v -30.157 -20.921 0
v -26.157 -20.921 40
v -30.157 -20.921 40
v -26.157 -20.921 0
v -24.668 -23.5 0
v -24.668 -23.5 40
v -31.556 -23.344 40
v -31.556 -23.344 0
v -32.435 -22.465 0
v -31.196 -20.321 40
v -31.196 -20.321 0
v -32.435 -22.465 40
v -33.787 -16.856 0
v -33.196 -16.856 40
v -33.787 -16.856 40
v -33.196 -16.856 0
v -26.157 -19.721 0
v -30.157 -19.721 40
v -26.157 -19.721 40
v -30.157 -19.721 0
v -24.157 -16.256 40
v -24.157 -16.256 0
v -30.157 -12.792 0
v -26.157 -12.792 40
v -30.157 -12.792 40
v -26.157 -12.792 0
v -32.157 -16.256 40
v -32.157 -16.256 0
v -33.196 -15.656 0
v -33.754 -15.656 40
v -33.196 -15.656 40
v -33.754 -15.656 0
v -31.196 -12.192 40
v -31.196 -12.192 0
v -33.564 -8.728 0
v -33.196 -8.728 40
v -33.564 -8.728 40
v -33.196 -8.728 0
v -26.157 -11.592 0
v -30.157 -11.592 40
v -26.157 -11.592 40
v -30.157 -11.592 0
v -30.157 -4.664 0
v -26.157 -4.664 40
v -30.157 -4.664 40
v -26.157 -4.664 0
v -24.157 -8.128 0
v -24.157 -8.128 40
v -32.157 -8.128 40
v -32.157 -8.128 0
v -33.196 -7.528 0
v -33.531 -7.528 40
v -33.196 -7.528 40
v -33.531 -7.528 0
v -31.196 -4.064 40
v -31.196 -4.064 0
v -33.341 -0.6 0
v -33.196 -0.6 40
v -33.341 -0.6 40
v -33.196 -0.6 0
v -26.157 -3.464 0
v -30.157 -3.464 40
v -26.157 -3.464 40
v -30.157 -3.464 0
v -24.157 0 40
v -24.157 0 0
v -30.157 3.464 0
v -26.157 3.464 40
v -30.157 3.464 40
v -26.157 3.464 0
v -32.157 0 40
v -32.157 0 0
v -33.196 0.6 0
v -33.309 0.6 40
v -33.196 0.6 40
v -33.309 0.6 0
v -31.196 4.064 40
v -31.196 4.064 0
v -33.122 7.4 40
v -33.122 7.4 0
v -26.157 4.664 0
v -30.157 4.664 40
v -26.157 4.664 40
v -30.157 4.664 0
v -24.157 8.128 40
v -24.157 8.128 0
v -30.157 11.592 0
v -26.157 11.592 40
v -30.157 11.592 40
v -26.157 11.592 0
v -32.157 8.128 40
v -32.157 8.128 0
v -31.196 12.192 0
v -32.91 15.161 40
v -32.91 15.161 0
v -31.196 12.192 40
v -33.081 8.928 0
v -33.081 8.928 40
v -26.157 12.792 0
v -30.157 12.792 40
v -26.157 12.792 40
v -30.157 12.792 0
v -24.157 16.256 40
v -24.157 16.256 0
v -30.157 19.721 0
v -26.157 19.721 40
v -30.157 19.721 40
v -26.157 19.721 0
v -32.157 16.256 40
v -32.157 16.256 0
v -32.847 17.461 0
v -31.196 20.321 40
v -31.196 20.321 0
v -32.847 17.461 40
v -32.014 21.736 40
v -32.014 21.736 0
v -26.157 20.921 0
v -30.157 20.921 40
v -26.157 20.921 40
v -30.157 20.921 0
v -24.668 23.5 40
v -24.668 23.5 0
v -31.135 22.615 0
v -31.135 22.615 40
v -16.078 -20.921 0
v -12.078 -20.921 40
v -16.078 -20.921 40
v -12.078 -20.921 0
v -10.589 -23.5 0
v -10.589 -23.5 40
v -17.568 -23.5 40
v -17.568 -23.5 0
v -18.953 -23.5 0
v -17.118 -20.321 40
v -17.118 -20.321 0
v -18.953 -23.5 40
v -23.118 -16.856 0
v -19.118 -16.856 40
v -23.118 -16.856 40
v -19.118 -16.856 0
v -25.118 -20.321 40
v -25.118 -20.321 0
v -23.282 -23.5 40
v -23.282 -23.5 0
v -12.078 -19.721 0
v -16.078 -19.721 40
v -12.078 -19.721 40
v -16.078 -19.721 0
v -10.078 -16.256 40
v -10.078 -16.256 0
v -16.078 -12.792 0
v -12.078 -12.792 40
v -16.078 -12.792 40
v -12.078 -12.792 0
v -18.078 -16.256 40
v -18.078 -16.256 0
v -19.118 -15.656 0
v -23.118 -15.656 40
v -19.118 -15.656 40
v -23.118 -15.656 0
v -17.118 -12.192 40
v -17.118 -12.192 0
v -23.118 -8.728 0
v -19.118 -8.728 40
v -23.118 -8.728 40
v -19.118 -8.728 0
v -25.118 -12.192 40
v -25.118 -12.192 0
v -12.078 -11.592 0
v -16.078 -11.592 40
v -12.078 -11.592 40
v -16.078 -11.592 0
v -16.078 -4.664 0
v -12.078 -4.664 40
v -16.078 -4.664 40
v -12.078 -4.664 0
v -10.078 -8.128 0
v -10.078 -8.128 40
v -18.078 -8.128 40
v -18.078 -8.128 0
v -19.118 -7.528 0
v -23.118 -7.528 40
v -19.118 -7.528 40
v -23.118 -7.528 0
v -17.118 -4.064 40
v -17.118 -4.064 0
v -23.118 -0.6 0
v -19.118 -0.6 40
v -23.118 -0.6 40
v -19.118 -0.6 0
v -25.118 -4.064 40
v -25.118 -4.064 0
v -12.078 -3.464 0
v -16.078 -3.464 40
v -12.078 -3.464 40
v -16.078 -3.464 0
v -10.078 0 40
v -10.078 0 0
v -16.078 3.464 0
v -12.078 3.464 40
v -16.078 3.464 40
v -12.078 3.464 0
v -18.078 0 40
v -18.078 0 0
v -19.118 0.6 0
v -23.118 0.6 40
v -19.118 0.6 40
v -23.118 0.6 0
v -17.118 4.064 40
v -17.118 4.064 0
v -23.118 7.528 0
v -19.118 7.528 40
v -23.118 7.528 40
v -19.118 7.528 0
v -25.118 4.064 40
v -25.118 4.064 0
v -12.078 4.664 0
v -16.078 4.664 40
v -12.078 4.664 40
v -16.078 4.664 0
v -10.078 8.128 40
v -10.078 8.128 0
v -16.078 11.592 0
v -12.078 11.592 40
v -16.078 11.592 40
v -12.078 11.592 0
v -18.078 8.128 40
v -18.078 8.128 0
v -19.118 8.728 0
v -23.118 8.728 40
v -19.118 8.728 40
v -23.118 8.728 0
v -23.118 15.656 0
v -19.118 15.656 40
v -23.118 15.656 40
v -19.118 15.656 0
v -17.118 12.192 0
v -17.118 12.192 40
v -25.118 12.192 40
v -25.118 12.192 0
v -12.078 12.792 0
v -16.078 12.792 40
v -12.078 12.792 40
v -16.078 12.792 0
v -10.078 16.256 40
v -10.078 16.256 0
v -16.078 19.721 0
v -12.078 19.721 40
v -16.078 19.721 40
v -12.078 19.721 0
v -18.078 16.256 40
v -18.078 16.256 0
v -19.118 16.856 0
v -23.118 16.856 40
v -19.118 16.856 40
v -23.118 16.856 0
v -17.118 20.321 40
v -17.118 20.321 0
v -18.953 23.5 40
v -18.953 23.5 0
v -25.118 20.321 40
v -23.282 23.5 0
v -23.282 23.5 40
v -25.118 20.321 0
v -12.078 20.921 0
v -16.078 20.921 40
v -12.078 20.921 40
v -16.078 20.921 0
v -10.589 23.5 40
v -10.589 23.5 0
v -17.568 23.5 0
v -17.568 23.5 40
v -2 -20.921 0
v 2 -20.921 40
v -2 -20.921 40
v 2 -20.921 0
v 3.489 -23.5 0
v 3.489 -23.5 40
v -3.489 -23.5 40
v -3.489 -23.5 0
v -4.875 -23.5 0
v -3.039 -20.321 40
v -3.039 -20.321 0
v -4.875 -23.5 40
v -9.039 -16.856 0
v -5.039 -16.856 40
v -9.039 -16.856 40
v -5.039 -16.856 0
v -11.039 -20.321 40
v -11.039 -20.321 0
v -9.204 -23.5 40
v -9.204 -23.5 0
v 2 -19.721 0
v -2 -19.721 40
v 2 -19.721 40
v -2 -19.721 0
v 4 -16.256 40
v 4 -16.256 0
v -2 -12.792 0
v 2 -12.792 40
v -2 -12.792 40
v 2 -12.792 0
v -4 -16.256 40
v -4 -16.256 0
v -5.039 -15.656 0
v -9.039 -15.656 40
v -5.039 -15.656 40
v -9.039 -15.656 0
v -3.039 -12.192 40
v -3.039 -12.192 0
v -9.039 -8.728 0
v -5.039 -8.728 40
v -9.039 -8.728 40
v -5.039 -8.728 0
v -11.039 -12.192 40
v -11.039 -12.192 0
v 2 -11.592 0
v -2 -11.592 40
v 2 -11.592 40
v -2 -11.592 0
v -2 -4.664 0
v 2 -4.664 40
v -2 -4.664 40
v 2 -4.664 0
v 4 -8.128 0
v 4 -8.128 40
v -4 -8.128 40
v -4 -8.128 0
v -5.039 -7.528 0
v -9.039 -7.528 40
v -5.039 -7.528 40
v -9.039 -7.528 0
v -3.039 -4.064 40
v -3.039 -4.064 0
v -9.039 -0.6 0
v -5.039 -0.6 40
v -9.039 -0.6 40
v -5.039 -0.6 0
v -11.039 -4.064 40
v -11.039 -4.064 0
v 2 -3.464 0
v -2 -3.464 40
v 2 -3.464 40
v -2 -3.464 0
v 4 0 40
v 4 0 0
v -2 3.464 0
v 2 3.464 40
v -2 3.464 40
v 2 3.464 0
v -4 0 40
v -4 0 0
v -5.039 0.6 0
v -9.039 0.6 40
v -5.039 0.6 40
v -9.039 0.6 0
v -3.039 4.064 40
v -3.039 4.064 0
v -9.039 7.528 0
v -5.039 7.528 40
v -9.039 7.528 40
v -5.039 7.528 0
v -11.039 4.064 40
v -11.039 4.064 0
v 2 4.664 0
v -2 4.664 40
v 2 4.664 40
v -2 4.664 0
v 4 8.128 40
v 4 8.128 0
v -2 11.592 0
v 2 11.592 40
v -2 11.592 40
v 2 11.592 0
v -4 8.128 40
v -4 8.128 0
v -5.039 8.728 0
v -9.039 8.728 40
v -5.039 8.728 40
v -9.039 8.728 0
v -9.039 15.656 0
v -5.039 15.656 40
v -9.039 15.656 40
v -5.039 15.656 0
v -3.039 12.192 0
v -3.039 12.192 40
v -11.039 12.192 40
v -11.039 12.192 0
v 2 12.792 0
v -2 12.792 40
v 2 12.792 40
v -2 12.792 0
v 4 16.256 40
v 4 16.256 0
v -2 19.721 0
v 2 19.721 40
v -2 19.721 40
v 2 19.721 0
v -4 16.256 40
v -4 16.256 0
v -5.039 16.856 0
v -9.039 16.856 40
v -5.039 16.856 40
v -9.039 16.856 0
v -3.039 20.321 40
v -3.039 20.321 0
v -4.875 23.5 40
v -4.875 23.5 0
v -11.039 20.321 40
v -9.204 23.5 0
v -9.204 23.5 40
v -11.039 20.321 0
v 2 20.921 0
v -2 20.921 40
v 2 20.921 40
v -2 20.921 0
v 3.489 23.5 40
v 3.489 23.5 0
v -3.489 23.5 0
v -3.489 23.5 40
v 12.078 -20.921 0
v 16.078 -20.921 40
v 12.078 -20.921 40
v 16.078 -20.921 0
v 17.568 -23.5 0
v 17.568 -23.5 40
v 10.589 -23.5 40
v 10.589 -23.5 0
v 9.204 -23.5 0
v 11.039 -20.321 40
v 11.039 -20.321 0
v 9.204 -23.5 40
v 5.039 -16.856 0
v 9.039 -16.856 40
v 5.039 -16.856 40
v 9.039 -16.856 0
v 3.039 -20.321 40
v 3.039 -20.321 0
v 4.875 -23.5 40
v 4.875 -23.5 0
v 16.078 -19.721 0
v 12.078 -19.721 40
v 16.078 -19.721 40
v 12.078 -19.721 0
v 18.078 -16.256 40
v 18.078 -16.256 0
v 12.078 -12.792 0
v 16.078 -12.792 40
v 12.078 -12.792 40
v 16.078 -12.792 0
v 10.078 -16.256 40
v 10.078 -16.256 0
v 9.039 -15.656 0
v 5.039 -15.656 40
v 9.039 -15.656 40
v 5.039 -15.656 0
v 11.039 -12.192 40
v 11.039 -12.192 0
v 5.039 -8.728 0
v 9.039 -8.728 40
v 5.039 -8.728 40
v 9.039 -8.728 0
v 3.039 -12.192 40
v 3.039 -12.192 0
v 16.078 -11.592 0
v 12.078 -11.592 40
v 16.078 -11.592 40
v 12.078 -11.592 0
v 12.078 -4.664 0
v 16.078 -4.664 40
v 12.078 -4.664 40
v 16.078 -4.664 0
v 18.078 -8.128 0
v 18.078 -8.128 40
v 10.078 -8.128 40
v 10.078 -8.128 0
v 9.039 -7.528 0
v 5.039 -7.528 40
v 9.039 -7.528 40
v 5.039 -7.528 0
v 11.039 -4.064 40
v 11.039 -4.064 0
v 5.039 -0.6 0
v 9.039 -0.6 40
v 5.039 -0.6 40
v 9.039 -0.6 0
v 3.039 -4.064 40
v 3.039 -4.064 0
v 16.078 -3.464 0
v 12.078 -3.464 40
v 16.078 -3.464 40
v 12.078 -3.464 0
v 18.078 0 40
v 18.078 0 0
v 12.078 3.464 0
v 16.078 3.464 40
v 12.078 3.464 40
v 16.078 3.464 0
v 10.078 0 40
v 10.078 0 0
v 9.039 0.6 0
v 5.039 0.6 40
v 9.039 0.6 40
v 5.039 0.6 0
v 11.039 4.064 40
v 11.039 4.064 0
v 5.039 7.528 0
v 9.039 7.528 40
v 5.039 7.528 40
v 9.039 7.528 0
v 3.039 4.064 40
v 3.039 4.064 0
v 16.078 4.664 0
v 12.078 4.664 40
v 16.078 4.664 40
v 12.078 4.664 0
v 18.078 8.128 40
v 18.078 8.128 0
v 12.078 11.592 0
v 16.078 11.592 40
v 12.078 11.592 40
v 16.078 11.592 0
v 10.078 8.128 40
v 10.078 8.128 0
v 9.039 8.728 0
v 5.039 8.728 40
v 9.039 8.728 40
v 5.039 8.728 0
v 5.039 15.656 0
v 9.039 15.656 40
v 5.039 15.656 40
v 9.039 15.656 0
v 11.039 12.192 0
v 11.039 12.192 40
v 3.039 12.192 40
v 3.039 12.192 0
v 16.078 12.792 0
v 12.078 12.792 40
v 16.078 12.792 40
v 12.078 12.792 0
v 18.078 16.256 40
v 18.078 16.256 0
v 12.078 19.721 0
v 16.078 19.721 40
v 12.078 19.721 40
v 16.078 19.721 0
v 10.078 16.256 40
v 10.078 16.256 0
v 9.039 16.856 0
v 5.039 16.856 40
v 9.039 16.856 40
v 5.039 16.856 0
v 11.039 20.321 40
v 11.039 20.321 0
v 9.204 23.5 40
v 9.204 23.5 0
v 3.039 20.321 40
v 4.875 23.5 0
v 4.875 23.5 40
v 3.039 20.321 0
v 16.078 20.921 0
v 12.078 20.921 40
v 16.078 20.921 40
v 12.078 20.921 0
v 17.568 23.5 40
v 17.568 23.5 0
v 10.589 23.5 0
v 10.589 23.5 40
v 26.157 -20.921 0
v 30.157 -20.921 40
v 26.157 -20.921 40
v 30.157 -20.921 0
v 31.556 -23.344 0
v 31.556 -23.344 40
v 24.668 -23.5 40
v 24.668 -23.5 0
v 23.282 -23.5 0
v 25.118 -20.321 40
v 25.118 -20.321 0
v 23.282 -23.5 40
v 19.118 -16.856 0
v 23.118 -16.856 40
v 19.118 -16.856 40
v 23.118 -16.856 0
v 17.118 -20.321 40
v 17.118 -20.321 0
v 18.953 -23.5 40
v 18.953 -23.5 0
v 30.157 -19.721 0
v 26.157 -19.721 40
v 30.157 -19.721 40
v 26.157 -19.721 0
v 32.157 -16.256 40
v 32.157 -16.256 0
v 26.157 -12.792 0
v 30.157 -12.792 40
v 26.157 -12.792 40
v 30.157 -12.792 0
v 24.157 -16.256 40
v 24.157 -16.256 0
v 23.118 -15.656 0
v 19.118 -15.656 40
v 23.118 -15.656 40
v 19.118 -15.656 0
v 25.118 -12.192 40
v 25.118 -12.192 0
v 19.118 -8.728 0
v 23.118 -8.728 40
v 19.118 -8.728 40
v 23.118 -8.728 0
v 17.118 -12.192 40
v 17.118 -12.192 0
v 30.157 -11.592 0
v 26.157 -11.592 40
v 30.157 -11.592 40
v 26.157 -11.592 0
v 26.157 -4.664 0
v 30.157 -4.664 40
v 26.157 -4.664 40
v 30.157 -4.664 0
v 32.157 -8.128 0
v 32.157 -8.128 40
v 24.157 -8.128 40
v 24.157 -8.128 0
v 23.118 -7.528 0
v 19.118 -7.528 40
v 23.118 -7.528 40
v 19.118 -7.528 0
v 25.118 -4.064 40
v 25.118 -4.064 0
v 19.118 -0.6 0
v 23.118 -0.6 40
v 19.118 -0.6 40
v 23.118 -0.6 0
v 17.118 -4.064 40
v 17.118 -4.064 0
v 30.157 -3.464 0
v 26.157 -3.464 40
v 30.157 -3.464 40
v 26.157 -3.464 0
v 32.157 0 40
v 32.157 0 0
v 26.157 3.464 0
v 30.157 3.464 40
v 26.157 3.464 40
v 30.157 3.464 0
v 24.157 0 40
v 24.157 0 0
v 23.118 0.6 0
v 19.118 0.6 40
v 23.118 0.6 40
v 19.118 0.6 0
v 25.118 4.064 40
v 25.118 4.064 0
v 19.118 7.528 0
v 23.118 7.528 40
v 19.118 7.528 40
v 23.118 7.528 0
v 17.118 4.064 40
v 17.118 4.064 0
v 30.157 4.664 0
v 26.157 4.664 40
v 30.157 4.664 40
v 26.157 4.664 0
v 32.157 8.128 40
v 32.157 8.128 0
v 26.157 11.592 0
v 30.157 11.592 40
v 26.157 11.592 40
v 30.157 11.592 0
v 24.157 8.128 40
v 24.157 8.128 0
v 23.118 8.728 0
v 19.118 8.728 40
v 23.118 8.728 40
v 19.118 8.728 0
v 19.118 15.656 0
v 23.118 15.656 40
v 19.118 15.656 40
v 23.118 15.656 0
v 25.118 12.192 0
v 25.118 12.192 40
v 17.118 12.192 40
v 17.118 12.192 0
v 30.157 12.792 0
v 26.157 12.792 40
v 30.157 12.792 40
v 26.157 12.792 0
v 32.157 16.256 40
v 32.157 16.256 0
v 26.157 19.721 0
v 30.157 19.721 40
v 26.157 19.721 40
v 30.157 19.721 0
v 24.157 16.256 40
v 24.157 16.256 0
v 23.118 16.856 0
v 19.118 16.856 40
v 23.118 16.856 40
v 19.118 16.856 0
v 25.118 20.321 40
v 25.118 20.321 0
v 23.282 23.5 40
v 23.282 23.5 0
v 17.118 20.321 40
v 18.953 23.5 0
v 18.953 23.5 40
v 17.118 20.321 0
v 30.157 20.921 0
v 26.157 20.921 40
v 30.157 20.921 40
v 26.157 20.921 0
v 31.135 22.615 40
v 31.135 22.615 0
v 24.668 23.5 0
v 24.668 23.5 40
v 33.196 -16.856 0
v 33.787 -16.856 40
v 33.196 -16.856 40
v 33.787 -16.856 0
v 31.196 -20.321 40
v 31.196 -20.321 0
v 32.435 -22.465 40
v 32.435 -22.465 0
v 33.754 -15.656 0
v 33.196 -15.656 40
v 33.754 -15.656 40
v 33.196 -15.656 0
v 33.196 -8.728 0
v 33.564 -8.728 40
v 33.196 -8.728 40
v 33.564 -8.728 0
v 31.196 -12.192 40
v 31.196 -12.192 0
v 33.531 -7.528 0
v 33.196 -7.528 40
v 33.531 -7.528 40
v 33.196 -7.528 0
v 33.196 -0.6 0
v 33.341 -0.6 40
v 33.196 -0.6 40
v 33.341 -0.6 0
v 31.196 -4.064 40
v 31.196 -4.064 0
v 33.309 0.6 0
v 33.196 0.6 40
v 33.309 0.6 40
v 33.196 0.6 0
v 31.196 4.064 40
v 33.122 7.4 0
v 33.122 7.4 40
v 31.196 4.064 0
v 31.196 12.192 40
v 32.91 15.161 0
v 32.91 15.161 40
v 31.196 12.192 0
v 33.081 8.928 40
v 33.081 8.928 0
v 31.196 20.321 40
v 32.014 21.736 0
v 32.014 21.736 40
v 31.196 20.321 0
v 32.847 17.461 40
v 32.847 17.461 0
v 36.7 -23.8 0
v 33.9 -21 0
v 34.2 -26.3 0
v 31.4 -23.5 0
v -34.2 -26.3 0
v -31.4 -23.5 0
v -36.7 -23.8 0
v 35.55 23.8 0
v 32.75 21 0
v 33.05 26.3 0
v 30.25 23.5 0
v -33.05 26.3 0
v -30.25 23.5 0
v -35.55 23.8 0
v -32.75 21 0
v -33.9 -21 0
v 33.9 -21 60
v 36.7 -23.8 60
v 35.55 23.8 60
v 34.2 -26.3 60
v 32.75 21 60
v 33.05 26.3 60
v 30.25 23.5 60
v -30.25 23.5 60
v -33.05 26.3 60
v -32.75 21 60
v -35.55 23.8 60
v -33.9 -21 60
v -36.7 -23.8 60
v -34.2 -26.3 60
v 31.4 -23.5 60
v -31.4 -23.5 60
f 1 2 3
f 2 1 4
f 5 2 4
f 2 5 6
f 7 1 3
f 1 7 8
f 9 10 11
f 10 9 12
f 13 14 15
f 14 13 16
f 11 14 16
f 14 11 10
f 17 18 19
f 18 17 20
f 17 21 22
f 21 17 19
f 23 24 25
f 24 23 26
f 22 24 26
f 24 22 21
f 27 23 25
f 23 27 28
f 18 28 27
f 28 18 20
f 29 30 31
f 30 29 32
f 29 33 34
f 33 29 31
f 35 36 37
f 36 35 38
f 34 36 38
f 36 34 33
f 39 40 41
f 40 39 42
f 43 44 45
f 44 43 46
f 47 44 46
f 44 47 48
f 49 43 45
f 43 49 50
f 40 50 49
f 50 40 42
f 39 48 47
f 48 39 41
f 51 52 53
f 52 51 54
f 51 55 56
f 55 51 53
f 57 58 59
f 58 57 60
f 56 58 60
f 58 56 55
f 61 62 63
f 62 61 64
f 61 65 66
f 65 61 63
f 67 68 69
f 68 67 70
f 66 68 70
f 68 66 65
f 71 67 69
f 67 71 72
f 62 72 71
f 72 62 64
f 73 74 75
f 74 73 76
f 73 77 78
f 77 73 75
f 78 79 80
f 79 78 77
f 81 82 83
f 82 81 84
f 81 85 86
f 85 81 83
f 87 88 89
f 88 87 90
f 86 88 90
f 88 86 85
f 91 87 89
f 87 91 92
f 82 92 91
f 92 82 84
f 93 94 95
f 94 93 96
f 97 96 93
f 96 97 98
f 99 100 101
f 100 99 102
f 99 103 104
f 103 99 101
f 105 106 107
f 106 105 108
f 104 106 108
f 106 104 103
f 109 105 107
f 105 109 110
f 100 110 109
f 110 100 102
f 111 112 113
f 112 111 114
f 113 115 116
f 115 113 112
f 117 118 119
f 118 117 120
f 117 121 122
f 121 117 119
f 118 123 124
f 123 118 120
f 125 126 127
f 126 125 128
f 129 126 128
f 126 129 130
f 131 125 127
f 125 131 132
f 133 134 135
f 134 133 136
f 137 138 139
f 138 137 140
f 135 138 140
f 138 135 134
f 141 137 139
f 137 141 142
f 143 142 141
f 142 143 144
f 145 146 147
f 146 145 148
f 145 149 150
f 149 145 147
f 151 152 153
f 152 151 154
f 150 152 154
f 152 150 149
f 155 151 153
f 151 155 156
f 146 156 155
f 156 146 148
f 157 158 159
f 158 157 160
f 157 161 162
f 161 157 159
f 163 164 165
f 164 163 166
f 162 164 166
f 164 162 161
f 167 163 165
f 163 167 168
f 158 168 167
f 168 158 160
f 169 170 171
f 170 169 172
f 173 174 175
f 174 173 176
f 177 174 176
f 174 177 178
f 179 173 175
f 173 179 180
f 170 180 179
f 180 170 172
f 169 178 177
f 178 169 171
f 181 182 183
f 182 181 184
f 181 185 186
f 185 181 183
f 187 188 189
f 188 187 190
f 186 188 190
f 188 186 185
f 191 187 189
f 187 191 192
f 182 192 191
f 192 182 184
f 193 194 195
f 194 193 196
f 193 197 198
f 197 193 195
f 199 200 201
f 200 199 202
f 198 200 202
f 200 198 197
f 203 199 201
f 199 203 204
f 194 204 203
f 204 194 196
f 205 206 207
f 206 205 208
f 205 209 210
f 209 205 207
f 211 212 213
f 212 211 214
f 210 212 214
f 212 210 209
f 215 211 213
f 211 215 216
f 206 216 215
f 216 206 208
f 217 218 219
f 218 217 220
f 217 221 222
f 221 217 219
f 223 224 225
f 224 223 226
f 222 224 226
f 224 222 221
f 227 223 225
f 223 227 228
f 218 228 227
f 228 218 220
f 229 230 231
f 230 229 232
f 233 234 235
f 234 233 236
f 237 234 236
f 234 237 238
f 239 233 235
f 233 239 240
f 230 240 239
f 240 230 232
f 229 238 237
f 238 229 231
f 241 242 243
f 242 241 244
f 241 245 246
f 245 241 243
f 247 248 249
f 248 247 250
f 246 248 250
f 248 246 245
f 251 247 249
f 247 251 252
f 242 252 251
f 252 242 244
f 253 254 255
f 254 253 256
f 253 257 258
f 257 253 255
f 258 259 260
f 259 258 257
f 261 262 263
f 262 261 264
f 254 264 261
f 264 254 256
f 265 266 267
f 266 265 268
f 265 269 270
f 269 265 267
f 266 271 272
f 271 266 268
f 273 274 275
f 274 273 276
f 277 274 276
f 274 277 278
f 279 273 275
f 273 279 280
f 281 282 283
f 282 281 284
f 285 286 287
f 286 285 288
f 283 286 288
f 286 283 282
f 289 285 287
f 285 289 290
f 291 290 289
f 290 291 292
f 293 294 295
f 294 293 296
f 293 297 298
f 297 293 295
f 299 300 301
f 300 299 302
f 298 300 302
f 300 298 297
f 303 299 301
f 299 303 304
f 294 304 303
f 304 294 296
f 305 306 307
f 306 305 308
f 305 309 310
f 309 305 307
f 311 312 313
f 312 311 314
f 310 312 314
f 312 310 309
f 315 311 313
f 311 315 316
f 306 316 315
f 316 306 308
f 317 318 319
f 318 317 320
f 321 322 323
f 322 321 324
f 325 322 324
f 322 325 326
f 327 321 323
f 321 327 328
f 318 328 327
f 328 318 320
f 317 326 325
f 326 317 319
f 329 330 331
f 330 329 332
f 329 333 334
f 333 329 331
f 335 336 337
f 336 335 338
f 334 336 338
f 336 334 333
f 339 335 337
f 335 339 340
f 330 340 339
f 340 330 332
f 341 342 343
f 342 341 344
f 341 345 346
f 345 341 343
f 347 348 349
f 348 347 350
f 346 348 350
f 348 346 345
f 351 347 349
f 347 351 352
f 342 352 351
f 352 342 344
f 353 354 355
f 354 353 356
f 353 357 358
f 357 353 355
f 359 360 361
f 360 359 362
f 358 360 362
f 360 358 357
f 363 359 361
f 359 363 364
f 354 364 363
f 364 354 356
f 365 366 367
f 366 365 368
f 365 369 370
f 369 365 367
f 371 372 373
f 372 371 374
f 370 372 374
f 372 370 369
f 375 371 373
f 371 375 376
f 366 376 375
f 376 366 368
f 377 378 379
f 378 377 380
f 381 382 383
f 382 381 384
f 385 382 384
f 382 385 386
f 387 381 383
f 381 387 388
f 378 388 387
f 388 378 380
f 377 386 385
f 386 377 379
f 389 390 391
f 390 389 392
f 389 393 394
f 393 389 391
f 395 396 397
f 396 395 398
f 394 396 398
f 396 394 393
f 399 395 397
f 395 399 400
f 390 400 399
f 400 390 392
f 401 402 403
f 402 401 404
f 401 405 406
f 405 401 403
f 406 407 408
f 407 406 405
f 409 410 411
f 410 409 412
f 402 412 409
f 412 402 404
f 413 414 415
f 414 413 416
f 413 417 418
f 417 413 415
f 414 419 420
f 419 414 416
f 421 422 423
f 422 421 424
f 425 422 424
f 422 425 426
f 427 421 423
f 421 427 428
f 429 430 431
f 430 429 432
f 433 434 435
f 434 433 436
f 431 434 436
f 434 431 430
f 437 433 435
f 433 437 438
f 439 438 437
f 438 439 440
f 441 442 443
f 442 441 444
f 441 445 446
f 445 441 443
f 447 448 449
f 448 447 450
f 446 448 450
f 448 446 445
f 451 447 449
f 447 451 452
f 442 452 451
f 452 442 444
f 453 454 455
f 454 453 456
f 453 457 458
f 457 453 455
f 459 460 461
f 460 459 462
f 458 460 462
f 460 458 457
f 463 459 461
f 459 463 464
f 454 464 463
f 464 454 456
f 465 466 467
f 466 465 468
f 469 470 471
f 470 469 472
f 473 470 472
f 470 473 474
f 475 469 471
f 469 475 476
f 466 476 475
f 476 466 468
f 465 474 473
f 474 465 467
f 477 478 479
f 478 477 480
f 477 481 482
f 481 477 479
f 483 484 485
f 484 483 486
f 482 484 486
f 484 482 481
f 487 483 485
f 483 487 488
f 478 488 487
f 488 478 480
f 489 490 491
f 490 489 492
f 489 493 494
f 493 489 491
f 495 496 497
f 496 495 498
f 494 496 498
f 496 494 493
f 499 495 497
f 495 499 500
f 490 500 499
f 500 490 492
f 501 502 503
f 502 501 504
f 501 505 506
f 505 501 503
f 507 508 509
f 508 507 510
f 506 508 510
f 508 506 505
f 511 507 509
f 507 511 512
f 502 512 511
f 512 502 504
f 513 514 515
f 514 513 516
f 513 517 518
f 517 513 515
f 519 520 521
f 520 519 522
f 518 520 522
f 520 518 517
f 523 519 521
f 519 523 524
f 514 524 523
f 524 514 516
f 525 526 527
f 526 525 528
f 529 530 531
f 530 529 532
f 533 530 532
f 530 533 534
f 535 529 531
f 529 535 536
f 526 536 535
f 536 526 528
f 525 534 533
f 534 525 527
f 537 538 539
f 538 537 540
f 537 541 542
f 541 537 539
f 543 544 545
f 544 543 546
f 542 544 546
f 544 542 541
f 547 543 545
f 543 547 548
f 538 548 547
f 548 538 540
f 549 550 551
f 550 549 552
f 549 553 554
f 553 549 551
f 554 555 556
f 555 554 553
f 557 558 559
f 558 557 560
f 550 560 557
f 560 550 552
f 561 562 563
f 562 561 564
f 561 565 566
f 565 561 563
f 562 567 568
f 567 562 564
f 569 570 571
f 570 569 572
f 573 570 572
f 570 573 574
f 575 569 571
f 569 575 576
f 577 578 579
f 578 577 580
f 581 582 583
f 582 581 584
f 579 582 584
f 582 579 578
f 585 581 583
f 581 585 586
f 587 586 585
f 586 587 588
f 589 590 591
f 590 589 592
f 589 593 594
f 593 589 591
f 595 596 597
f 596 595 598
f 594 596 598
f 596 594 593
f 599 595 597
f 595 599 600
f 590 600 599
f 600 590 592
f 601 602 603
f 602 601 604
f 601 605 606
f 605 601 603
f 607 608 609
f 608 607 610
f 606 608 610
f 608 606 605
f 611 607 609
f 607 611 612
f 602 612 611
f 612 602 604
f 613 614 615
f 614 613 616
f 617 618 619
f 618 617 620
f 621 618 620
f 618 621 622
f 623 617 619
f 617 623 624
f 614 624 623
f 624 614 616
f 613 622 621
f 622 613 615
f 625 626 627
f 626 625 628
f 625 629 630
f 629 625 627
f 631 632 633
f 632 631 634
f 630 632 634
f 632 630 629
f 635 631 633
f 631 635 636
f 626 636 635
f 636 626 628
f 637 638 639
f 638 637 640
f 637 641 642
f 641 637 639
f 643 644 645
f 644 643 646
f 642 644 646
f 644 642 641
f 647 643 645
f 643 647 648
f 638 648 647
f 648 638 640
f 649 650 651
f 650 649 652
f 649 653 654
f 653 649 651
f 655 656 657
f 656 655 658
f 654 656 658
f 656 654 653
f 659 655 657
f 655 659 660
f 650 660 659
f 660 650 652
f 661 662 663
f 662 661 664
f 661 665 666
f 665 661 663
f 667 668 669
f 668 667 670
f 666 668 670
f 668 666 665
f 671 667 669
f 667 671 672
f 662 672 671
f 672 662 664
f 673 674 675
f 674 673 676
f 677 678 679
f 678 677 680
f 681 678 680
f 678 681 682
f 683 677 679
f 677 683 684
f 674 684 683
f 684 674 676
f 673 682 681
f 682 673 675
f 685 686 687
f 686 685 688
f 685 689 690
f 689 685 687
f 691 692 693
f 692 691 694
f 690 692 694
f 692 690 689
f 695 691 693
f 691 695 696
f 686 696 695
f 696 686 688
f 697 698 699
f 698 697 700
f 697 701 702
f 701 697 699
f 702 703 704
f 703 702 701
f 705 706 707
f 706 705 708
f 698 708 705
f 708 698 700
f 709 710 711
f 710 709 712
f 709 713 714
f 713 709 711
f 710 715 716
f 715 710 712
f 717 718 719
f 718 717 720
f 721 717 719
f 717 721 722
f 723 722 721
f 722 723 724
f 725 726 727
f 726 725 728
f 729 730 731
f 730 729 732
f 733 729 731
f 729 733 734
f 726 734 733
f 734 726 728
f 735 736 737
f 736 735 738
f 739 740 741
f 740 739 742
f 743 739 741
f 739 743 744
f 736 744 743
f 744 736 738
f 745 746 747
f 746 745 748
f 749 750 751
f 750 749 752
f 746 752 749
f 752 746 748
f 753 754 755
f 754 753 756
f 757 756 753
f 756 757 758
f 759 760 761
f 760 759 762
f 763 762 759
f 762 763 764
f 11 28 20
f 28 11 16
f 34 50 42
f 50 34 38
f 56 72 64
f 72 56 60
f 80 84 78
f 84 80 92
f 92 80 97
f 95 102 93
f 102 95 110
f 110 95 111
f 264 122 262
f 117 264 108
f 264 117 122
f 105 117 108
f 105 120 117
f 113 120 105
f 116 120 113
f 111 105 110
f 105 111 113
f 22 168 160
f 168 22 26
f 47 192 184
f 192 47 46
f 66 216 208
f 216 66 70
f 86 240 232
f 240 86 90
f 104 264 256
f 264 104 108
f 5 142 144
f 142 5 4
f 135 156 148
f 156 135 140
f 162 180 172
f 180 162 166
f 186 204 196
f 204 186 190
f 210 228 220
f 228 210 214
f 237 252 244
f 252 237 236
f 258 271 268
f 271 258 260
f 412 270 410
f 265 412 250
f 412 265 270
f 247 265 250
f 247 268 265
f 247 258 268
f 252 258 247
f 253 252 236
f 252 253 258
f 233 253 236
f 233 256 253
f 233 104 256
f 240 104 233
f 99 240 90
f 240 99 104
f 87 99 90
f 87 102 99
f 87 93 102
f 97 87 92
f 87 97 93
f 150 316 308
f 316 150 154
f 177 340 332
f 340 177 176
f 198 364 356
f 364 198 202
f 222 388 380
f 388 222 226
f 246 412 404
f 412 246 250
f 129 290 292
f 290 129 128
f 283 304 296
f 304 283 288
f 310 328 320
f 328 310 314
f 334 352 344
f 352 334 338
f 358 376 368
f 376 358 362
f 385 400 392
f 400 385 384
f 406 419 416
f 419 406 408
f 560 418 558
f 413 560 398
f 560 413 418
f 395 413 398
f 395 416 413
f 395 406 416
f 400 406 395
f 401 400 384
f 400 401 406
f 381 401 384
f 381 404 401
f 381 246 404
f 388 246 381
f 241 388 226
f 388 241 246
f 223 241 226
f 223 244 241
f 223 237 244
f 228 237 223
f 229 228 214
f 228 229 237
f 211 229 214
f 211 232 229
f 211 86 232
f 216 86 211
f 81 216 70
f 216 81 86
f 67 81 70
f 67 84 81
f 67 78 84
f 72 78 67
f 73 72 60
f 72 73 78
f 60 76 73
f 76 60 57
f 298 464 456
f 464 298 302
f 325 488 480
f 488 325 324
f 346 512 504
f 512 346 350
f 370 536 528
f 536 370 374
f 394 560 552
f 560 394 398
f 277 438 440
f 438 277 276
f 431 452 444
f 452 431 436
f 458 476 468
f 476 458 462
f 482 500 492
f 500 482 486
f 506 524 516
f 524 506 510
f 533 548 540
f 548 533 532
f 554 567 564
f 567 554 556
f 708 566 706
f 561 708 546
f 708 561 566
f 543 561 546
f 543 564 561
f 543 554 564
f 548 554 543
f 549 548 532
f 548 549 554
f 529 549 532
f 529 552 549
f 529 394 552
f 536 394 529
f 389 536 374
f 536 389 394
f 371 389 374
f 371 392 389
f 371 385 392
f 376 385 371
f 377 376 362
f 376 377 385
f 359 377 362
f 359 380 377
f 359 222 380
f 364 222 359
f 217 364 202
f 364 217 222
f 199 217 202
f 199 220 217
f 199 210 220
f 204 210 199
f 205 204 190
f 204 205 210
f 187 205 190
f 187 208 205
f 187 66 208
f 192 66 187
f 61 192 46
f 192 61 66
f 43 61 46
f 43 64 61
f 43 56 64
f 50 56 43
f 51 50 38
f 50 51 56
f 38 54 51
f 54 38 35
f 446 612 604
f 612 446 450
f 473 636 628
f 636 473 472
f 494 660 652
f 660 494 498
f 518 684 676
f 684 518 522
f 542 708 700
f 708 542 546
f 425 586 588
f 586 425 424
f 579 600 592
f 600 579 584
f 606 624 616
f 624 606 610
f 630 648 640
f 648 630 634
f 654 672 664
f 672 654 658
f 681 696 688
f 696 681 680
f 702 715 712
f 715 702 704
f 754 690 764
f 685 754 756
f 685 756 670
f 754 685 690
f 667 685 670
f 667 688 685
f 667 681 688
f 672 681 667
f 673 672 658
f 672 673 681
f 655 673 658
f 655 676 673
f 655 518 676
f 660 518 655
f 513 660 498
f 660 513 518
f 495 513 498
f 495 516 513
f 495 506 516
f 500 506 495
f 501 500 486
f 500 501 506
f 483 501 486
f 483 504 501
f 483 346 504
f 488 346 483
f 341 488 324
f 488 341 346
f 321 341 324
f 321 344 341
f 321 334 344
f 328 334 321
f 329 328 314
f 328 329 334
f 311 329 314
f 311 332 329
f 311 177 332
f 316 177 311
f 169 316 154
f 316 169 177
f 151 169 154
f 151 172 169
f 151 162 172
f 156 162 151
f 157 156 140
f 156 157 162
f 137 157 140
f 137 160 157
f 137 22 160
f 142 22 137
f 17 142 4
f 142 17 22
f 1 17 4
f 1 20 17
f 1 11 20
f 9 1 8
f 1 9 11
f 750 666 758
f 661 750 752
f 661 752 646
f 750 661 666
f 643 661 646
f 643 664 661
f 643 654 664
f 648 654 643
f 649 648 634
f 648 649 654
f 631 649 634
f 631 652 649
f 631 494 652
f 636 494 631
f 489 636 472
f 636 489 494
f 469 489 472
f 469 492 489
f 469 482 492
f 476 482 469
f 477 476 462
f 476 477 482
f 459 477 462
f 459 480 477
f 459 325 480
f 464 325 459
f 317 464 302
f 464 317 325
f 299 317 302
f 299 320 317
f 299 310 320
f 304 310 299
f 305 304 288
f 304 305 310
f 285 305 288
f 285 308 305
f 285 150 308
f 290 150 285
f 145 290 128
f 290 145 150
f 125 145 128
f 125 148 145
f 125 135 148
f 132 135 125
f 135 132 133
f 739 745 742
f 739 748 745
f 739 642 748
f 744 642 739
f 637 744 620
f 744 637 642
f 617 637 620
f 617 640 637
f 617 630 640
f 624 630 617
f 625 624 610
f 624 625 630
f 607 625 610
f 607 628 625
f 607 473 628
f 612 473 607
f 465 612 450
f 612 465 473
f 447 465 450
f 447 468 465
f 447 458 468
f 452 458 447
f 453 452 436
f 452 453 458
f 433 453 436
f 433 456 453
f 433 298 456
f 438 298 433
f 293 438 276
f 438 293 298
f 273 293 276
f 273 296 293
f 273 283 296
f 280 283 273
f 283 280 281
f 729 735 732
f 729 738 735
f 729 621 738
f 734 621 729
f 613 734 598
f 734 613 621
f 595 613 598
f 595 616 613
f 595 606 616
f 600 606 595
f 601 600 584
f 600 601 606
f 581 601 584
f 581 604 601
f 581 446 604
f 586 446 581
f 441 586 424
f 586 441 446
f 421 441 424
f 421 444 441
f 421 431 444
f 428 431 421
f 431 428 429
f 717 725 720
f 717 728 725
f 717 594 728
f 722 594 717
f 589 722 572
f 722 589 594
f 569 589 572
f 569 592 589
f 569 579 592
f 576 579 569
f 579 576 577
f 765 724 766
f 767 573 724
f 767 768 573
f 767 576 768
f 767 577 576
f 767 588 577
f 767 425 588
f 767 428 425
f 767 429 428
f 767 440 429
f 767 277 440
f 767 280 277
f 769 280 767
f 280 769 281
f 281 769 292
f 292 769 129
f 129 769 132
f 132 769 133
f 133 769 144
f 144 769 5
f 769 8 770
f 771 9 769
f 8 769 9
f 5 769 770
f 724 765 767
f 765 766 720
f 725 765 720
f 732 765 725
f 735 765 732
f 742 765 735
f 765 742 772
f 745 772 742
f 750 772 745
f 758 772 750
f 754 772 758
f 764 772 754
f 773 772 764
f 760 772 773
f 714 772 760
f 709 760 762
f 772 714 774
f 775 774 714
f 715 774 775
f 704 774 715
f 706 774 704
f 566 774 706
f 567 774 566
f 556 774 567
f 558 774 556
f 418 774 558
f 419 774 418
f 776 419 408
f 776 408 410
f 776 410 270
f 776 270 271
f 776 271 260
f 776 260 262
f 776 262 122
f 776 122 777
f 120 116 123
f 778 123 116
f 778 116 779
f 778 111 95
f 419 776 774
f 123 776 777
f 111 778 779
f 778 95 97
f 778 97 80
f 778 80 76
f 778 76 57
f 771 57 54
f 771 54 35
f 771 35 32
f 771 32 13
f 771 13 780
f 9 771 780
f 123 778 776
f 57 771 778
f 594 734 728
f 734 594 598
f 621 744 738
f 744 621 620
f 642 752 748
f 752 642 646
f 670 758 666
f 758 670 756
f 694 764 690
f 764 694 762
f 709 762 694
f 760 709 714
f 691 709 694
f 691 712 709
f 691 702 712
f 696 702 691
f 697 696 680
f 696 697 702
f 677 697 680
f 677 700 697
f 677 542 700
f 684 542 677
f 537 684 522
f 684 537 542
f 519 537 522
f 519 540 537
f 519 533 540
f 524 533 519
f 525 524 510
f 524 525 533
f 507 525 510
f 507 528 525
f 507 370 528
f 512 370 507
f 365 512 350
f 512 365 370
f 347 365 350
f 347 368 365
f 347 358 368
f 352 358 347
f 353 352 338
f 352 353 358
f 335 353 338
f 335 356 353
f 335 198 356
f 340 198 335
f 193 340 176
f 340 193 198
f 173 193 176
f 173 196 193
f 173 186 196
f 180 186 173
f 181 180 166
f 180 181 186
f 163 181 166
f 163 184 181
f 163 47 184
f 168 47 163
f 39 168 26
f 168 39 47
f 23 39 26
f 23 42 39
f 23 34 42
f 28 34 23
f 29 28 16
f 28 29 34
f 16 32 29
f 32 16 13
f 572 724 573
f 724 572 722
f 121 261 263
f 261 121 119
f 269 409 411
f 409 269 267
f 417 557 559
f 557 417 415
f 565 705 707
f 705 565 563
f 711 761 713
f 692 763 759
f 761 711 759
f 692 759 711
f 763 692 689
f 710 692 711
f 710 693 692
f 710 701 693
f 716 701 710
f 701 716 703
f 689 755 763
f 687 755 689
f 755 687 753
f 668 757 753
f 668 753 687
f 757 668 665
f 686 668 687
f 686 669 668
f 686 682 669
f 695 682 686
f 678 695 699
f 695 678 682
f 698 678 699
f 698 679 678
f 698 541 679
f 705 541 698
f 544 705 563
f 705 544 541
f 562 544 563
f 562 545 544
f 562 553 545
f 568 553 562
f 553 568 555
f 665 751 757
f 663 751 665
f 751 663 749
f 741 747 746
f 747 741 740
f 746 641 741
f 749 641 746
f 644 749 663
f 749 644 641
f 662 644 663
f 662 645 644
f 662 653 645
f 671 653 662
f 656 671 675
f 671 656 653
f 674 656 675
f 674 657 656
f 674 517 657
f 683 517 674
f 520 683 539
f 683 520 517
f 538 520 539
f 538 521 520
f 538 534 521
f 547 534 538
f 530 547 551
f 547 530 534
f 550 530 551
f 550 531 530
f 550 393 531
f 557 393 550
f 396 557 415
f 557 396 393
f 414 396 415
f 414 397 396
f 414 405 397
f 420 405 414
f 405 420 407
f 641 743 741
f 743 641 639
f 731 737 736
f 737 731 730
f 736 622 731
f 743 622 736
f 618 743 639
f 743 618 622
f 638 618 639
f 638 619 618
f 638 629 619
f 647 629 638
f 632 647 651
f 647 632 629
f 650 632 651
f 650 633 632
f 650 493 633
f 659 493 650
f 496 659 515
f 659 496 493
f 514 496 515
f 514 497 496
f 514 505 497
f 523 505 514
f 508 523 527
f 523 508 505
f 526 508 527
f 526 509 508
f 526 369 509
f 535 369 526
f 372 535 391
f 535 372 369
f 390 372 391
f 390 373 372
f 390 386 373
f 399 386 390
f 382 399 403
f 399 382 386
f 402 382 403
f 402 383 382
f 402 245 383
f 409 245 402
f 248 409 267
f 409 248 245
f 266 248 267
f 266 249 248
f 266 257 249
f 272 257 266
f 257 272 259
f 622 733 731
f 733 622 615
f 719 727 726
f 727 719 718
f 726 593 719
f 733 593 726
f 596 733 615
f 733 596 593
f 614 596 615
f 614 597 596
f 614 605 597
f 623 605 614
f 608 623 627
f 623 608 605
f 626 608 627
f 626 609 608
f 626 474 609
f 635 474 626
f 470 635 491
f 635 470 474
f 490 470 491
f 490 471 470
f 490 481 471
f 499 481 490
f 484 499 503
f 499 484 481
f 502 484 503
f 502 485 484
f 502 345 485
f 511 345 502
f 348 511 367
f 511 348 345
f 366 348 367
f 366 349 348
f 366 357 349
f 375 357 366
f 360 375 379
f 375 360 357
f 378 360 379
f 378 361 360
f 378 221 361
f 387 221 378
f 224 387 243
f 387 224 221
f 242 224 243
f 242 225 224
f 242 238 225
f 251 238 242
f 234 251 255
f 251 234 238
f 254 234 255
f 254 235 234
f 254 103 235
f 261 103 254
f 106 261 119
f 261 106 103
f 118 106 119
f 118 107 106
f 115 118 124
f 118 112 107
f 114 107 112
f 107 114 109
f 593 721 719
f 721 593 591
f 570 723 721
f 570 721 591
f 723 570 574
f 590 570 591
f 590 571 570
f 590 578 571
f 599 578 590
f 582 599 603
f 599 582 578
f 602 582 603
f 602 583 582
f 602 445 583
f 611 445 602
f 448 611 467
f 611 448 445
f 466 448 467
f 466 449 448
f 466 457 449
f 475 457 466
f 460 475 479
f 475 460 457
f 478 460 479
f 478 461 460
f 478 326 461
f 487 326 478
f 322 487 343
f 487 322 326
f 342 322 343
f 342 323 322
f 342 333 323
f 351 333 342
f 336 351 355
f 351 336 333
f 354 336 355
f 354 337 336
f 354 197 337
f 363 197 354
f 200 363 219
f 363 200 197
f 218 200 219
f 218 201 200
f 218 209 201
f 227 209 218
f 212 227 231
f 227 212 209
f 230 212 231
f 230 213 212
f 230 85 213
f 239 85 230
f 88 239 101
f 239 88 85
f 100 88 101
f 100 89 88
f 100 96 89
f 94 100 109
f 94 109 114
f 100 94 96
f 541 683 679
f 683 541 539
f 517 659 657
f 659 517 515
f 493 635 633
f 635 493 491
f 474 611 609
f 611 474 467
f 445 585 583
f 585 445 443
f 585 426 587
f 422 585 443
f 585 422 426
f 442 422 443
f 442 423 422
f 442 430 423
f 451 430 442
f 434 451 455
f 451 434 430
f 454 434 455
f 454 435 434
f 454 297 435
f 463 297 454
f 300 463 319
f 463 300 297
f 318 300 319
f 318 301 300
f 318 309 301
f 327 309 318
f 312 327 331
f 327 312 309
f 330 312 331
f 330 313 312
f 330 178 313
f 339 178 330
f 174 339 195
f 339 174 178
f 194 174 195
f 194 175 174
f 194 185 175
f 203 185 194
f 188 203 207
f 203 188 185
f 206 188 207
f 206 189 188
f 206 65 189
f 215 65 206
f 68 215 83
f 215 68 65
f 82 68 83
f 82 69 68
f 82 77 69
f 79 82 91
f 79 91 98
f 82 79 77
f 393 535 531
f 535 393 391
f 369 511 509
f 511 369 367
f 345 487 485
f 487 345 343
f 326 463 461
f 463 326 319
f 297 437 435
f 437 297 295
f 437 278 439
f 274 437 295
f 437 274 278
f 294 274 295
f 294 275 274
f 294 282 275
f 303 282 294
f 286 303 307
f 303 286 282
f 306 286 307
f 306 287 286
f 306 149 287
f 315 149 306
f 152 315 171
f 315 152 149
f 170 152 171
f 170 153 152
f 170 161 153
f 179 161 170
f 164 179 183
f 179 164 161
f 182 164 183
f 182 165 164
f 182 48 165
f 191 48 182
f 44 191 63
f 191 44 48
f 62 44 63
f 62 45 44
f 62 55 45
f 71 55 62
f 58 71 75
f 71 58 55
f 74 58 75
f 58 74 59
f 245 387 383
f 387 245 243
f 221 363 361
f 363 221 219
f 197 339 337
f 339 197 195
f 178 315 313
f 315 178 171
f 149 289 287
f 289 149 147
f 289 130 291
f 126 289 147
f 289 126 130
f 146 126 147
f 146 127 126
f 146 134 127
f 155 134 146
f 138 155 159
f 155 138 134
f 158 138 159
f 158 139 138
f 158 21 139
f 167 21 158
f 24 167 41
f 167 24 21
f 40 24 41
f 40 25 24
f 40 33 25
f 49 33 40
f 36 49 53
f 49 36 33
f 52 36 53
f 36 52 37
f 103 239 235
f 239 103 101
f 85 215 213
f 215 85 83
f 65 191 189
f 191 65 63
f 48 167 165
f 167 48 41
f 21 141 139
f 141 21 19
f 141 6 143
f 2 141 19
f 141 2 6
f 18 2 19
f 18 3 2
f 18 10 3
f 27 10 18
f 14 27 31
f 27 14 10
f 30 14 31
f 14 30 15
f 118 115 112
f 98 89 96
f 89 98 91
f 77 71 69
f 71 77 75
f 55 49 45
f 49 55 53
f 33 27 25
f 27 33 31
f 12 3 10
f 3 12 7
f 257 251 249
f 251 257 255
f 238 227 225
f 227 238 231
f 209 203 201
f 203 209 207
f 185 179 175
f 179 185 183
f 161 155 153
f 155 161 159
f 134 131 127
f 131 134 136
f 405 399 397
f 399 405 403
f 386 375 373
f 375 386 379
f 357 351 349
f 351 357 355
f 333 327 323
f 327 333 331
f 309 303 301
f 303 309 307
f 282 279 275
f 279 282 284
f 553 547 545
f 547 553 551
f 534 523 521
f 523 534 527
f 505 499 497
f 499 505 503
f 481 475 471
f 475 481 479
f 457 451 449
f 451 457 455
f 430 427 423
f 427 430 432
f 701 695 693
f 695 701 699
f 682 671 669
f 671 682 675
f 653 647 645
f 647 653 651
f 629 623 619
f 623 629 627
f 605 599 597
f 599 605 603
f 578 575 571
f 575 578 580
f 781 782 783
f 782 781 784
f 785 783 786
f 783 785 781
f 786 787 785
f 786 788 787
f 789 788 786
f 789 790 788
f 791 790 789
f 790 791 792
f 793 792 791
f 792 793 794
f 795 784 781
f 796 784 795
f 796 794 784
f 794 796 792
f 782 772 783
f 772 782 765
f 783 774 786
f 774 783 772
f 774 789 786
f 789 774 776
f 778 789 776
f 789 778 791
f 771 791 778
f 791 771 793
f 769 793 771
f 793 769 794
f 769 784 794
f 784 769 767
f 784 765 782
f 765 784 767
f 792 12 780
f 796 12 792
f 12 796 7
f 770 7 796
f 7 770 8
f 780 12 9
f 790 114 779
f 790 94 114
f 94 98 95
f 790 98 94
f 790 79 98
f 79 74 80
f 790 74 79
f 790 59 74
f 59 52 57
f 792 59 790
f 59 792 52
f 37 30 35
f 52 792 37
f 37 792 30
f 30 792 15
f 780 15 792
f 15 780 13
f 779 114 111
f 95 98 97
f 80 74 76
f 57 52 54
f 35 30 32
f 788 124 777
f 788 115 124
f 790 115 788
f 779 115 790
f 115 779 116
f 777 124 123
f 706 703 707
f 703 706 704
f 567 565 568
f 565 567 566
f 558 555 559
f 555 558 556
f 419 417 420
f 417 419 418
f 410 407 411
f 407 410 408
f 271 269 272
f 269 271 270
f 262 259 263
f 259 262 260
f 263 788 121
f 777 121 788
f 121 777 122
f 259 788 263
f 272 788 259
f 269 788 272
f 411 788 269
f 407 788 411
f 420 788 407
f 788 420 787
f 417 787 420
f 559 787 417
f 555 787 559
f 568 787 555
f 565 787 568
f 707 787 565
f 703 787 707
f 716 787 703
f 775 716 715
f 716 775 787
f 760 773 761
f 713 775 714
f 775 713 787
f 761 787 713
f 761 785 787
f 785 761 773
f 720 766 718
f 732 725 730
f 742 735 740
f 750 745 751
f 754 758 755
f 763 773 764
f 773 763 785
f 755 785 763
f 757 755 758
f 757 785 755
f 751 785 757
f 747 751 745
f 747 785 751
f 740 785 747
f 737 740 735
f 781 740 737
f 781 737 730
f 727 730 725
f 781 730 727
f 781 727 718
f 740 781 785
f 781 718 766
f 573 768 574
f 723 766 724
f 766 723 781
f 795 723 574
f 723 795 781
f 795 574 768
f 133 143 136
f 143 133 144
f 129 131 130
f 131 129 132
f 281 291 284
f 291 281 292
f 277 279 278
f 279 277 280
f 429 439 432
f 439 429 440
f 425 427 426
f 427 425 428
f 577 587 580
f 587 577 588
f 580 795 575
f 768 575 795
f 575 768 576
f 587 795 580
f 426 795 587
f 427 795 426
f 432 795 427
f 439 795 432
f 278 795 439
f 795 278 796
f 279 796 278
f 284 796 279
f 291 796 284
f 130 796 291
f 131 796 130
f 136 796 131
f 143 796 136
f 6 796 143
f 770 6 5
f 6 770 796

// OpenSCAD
// file: ../mylib/hexpattern.scad
/* hexdiam: space between two facing corners of a hextile
 * spacing: space between every side of the adjacent hextiles
 * heigt:   height (z-axis) of tiles
 * widthxy: space (x- andy-axis) occupied by the hextiles 
 *
 * Centering is only approximate :-)
*/
module hexpattern(hexdiam=8, spacing=2, h=40, widthx=100, widthy=100) {
    size_x = 3/2*(hexdiam)+spacing*sqrt(3);
    size_y = spacing+sqrt(3)/2*hexdiam;
    num_x = ceil(widthx/size_x);
    num_y = ceil(widthy/size_y);
    translate([-size_x*num_x/2, -size_y*num_y/2,0])
        for (ix=[0:num_x]) {
            translate([ix*size_x,0,0])
            for (iy=[0:num_y]) {
                translate([0,size_y*iy,0])
                    cylinder(r=hexdiam/2, h=h+2, $fn=6);
                translate([size_x/2, (1/2+iy)*size_y,0])
                    cylinder(r=hexdiam/2, h=h+2, $fn=6);
            }
        }
}
// main file
include <../mylib/hexpattern.scad>;

/* this defines the flash's outline
*/
mb_width1 = 67.8;
mb_width2 = 65.5;
mb_height = 47.0;
mb_edge   = 2.5;

// unused as of now
height_colorfilter = 52;

module mecablitz_58af2_snoot_solid(h=20, w=0) {
    linear_extrude(height = h)
        polygon(points = [
            //outer space
            [-mb_width1/2+mb_edge-w,-mb_height/2-w],
            [mb_width1/2-mb_edge+w,-mb_height/2-w],
            [mb_width1/2+w,-mb_height/2+mb_edge-w],
            [mb_width2/2+w,mb_height/2-mb_edge+w],
            [mb_width2/2-mb_edge+w,mb_height/2+w],
            [-mb_width2/2+mb_edge-w,mb_height/2+w],
            [-mb_width2/2-w,mb_height/2-mb_edge+w],
            [-mb_width1/2-w,-mb_height/2+mb_edge-w],
            ], paths = [
            [0,1,2,3,4,5,6,7,0],
            ]
        );
}

module mecablitz_58af2_snoot_hollow(h=20, w=2) {
    linear_extrude(height = h)
        polygon(points = [
            //outer shape
            [-mb_width1/2+mb_edge-w,-mb_height/2-w],
            [mb_width1/2-mb_edge+w,-mb_height/2-w],
            [mb_width1/2+w,-mb_height/2+mb_edge-w],
            [mb_width2/2+w,mb_height/2-mb_edge+w],
            [mb_width2/2-mb_edge+w,mb_height/2+w],
            [-mb_width2/2+mb_edge-w,mb_height/2+w],
            [-mb_width2/2-w,mb_height/2-mb_edge+w],
            [-mb_width1/2-w,-mb_height/2+mb_edge-w],
            // inner shape
            [-mb_width1/2+mb_edge,-mb_height/2],
            [mb_width1/2-mb_edge,-mb_height/2],
            [mb_width1/2,-mb_height/2+mb_edge],
            [mb_width2/2,mb_height/2-mb_edge],
            [mb_width2/2-mb_edge,mb_height/2],
            [-mb_width2/2+mb_edge,mb_height/2],
            [-mb_width2/2,mb_height/2-mb_edge],
            [-mb_width1/2,-mb_height/2+mb_edge]
            ],
            paths = [
            [0,1,2,3,4,5,6,7],
            [8,9,10,11,12,13,14,15]
            ]
        );
}

//translate([0,65,0])
union() {
    difference() {
        mecablitz_58af2_snoot_solid(h=40, w=1);
        translate([0,0,-1]) hexpattern(hexdiam=8, h=60+2, spacing=1.2, widthx=65, widthy=50);
    }
    mecablitz_58af2_snoot_hollow(h=60,w=2.8);
}

/*
difference() {
    mecablitz_58af2_snoot_solid(h=80, w=3);
    translate([0,0,-1]) mecablitz_58af2_snoot_solid(h=82, w=-2);
    translate([0,0,60-1]) mecablitz_58af2_snoot_solid(h=22, w=0);
}
*/
